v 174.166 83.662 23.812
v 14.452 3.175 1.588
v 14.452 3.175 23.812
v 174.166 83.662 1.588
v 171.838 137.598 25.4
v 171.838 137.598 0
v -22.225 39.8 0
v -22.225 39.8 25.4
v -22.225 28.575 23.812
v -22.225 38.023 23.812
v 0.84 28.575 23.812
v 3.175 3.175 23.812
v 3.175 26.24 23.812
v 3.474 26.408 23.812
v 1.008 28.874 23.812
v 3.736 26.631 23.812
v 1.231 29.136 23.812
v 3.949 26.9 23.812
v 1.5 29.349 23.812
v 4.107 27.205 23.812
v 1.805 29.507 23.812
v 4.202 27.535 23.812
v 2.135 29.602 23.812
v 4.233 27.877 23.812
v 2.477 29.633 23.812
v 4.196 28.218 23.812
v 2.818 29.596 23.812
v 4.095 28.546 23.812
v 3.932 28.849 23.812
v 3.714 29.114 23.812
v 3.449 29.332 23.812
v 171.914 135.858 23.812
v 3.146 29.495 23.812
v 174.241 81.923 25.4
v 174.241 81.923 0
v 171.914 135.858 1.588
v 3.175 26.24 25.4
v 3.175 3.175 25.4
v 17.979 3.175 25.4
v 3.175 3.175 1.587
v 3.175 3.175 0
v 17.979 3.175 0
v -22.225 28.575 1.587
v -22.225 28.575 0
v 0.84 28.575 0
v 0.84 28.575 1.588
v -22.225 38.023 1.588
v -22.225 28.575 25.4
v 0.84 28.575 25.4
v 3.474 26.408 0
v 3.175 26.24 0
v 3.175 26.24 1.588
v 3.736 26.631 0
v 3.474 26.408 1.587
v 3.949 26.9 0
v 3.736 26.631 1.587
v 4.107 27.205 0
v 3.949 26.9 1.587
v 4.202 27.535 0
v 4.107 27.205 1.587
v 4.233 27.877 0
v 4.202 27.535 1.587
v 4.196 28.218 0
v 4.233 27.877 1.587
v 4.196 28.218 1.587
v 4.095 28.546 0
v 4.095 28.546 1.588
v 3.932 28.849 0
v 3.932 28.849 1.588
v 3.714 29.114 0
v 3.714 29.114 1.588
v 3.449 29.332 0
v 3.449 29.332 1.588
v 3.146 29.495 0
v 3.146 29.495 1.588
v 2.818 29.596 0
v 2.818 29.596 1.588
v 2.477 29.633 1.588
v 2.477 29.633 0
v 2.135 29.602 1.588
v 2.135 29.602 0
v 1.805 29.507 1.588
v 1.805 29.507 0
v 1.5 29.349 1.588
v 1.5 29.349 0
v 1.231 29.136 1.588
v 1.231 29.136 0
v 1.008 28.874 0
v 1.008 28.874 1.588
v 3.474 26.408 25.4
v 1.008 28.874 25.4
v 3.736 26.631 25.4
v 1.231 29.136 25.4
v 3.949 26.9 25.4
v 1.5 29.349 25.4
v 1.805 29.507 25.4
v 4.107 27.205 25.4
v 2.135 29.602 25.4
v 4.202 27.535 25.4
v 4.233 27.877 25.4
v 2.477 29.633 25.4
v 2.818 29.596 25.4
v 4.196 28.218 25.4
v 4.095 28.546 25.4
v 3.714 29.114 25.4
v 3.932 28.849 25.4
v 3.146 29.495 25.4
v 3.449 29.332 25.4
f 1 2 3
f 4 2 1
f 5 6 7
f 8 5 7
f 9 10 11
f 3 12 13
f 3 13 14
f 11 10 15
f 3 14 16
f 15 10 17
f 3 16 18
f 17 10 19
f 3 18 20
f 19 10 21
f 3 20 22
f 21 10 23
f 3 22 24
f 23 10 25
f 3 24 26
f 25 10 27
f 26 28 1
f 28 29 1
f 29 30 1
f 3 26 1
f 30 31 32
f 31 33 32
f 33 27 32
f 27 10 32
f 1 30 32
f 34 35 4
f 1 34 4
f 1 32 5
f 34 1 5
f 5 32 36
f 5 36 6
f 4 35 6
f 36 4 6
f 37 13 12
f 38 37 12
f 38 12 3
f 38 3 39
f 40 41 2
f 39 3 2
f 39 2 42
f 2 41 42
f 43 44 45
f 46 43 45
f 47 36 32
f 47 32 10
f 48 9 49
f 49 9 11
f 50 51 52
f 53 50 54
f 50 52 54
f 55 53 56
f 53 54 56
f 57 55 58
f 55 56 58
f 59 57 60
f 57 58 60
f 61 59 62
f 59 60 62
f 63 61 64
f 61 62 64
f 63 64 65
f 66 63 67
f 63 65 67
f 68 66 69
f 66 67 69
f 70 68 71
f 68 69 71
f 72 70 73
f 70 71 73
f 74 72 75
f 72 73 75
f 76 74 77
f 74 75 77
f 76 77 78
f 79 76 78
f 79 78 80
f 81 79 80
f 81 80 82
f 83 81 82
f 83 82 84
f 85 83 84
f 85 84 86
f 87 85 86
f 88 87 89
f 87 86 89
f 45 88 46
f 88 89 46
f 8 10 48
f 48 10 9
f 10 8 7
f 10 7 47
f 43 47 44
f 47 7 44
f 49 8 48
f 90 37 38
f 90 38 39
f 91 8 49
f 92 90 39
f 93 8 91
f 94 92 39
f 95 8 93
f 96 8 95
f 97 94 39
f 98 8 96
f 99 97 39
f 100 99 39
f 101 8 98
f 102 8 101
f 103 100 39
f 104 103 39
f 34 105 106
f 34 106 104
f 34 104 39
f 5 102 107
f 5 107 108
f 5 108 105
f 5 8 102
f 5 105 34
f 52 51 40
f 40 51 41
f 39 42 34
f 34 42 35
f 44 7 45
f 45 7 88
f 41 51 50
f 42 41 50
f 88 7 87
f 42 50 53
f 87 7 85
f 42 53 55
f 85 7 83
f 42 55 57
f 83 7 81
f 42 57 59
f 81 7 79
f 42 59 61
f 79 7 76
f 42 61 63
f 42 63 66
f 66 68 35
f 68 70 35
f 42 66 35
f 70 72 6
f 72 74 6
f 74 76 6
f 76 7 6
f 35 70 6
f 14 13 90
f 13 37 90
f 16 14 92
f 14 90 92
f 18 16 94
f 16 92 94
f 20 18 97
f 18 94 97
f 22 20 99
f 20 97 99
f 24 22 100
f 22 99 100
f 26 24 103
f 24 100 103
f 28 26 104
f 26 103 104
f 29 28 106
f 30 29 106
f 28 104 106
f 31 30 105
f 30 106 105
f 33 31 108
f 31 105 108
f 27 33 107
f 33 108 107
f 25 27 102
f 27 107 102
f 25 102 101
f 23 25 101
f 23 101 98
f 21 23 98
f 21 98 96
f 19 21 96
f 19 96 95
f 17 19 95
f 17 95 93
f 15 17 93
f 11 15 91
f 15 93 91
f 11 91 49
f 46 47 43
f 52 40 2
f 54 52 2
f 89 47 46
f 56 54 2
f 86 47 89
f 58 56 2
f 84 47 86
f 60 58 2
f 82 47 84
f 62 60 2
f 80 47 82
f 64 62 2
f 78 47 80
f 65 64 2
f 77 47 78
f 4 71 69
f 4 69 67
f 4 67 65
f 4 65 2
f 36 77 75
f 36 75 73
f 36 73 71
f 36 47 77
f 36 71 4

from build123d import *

# Parameters (mm, degrees)
BOSS_EXTRUDE1_DEPTH = 25.4
SHELL1_T            = -1.5875
SKETCH2_R           = 1.771315789
CUT_EXTRUDE1_DEPTH  = 224.468749705


with BuildPart() as part:
    # Sketch1 → Boss-Extrude1 (new body)
    with BuildSketch(Plane.XY):
        Polygon((171.8384328, 137.597905652), (-22.225, 39.800277228), (-22.225, 28.575), (3.175, 28.575), (3.175, 3.175), (17.979241427, 3.175), (174.241035508, 81.922616972), align=None)
    extrude(amount=BOSS_EXTRUDE1_DEPTH)

    # Shell1
    shell1_openings = [part.faces().sort_by_distance(p)[0] for p in [
        (10.577120713, 3.175, 12.7),
        (3.175, 15.875, 12.7),
        (-9.525, 28.575, 12.7),
        (-22.225, 34.187638614, 12.7),
        (173.039734154, 109.760261312, 12.7),
    ]]
    offset(amount=SHELL1_T, openings=shell1_openings, kind=Kind.INTERSECTION)

    # Sketch2 → Cut-Extrude1 (cut, through all)
    with BuildSketch(Plane.XY.offset(25.4)):
        with Locations((2.461305961, 27.861305961)):
            Circle(SKETCH2_R)
    extrude(amount=-CUT_EXTRUDE1_DEPTH, mode=Mode.SUBTRACT)


solid = part.part
